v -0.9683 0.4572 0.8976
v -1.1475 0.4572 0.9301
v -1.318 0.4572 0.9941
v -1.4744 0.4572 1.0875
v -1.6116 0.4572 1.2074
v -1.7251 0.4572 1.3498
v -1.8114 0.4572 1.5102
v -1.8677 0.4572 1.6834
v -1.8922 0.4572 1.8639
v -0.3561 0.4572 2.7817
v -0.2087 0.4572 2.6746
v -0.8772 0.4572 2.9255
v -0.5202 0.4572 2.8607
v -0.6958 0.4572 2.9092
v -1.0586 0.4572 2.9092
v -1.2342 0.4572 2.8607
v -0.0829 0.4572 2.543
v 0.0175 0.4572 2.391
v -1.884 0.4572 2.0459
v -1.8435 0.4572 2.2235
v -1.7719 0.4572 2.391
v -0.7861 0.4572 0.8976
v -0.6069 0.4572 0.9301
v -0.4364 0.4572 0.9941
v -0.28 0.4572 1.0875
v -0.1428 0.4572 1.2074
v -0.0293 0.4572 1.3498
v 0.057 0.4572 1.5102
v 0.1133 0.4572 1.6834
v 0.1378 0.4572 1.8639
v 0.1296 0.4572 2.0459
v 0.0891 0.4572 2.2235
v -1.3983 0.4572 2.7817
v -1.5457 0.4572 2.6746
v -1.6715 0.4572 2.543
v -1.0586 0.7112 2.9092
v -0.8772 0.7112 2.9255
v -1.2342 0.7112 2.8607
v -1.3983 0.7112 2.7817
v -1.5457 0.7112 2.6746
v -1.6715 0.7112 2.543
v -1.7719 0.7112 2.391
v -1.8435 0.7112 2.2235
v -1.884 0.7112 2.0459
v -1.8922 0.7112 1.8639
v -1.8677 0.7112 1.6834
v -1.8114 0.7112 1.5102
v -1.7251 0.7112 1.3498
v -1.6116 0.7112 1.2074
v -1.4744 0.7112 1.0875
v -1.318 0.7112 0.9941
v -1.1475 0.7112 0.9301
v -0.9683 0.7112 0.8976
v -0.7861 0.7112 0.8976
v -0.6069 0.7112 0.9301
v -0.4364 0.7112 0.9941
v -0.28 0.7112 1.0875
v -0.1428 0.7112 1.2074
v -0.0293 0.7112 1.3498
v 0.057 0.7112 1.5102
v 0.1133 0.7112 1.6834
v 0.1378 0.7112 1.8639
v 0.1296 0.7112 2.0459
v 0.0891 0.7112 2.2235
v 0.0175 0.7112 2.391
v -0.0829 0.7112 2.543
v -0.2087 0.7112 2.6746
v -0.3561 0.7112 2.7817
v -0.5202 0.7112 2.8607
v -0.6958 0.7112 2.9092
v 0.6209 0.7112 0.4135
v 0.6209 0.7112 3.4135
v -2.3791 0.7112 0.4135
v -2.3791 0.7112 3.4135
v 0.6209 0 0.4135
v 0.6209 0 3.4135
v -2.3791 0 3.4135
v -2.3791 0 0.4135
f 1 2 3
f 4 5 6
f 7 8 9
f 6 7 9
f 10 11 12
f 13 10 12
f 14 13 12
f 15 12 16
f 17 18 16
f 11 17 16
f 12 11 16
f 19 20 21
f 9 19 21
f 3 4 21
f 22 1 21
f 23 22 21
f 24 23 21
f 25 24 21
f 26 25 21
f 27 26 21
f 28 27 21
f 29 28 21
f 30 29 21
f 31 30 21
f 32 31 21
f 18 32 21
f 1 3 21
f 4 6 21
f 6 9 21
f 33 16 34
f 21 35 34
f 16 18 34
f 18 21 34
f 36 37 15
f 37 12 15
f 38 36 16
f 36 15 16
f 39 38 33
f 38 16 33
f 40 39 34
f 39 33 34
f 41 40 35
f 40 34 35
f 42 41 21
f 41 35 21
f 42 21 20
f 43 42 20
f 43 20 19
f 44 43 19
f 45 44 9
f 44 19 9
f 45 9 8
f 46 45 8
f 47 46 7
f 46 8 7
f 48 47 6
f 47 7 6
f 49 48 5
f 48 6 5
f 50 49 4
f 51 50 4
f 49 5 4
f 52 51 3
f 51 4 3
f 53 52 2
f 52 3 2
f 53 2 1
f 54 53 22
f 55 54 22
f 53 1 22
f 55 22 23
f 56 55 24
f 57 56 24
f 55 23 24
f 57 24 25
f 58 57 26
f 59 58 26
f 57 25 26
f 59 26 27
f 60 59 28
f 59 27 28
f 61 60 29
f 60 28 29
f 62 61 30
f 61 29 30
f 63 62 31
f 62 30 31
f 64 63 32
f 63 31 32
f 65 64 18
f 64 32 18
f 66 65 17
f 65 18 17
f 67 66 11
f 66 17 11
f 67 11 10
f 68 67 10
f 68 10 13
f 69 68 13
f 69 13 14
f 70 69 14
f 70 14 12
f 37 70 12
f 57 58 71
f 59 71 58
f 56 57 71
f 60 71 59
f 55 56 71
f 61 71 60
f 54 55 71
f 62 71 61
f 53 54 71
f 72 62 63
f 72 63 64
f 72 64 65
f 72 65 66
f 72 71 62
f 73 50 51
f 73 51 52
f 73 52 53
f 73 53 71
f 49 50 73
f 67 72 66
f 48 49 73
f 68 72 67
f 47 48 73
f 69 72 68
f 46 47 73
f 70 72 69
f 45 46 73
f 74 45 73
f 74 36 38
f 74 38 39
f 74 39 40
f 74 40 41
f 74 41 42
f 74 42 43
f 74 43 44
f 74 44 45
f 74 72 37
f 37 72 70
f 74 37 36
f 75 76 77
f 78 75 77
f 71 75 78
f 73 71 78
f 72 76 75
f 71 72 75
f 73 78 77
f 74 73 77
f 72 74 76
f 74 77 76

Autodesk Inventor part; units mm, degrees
ref_plane "YZ Plane" through (0, 0, 0) normal (1, 0, 0) x (0, 1, 0)
ref_plane "XZ Plane" through (0, 0, 0) normal (0, 1, 0) x (-1, 0, 0)
ref_plane "XY Plane" through (0, 0, 0) normal (0, 0, 1) x (1, 0, 0)
sketch "Sketch1" plane through (0, 0, 0) normal (0, 1, 0) x (-1, 0, 0)
  line L0 (2.3791, 3.4135) -> (-0.6209, 3.4135)
  line L1 (-0.6209, 3.4135) -> (-0.6209, 0.4135)
  line L2 (-0.6209, 0.4135) -> (2.3791, 0.4135)
  line L3 (2.3791, 0.4135) -> (2.3791, 3.4135)
  point P0 (0, 0)
  dimension "d0" = 3
  dimension "d1" = 3
extrude "Extrusion1" add sketch "Sketch1" along normal blind 0.7112
sketch "Sketch2" plane through (0, 0.7112, 0) normal (0, 1, 0) x (1, 0, 0)
  point P0 (0, 0)
sketch "Sketch3" plane through (0, 0.7112, 0) normal (0, 1, 0) x (1, 0, 0)
  point P0 (0, 0)
  point P1 (-0.8772, -1.9095)
hole "Hole1" at (-0.8772, 0.7112, 1.9095) direction (0, -1, 0) diameter 2.032 depth 0.254
properties part number "LED"
